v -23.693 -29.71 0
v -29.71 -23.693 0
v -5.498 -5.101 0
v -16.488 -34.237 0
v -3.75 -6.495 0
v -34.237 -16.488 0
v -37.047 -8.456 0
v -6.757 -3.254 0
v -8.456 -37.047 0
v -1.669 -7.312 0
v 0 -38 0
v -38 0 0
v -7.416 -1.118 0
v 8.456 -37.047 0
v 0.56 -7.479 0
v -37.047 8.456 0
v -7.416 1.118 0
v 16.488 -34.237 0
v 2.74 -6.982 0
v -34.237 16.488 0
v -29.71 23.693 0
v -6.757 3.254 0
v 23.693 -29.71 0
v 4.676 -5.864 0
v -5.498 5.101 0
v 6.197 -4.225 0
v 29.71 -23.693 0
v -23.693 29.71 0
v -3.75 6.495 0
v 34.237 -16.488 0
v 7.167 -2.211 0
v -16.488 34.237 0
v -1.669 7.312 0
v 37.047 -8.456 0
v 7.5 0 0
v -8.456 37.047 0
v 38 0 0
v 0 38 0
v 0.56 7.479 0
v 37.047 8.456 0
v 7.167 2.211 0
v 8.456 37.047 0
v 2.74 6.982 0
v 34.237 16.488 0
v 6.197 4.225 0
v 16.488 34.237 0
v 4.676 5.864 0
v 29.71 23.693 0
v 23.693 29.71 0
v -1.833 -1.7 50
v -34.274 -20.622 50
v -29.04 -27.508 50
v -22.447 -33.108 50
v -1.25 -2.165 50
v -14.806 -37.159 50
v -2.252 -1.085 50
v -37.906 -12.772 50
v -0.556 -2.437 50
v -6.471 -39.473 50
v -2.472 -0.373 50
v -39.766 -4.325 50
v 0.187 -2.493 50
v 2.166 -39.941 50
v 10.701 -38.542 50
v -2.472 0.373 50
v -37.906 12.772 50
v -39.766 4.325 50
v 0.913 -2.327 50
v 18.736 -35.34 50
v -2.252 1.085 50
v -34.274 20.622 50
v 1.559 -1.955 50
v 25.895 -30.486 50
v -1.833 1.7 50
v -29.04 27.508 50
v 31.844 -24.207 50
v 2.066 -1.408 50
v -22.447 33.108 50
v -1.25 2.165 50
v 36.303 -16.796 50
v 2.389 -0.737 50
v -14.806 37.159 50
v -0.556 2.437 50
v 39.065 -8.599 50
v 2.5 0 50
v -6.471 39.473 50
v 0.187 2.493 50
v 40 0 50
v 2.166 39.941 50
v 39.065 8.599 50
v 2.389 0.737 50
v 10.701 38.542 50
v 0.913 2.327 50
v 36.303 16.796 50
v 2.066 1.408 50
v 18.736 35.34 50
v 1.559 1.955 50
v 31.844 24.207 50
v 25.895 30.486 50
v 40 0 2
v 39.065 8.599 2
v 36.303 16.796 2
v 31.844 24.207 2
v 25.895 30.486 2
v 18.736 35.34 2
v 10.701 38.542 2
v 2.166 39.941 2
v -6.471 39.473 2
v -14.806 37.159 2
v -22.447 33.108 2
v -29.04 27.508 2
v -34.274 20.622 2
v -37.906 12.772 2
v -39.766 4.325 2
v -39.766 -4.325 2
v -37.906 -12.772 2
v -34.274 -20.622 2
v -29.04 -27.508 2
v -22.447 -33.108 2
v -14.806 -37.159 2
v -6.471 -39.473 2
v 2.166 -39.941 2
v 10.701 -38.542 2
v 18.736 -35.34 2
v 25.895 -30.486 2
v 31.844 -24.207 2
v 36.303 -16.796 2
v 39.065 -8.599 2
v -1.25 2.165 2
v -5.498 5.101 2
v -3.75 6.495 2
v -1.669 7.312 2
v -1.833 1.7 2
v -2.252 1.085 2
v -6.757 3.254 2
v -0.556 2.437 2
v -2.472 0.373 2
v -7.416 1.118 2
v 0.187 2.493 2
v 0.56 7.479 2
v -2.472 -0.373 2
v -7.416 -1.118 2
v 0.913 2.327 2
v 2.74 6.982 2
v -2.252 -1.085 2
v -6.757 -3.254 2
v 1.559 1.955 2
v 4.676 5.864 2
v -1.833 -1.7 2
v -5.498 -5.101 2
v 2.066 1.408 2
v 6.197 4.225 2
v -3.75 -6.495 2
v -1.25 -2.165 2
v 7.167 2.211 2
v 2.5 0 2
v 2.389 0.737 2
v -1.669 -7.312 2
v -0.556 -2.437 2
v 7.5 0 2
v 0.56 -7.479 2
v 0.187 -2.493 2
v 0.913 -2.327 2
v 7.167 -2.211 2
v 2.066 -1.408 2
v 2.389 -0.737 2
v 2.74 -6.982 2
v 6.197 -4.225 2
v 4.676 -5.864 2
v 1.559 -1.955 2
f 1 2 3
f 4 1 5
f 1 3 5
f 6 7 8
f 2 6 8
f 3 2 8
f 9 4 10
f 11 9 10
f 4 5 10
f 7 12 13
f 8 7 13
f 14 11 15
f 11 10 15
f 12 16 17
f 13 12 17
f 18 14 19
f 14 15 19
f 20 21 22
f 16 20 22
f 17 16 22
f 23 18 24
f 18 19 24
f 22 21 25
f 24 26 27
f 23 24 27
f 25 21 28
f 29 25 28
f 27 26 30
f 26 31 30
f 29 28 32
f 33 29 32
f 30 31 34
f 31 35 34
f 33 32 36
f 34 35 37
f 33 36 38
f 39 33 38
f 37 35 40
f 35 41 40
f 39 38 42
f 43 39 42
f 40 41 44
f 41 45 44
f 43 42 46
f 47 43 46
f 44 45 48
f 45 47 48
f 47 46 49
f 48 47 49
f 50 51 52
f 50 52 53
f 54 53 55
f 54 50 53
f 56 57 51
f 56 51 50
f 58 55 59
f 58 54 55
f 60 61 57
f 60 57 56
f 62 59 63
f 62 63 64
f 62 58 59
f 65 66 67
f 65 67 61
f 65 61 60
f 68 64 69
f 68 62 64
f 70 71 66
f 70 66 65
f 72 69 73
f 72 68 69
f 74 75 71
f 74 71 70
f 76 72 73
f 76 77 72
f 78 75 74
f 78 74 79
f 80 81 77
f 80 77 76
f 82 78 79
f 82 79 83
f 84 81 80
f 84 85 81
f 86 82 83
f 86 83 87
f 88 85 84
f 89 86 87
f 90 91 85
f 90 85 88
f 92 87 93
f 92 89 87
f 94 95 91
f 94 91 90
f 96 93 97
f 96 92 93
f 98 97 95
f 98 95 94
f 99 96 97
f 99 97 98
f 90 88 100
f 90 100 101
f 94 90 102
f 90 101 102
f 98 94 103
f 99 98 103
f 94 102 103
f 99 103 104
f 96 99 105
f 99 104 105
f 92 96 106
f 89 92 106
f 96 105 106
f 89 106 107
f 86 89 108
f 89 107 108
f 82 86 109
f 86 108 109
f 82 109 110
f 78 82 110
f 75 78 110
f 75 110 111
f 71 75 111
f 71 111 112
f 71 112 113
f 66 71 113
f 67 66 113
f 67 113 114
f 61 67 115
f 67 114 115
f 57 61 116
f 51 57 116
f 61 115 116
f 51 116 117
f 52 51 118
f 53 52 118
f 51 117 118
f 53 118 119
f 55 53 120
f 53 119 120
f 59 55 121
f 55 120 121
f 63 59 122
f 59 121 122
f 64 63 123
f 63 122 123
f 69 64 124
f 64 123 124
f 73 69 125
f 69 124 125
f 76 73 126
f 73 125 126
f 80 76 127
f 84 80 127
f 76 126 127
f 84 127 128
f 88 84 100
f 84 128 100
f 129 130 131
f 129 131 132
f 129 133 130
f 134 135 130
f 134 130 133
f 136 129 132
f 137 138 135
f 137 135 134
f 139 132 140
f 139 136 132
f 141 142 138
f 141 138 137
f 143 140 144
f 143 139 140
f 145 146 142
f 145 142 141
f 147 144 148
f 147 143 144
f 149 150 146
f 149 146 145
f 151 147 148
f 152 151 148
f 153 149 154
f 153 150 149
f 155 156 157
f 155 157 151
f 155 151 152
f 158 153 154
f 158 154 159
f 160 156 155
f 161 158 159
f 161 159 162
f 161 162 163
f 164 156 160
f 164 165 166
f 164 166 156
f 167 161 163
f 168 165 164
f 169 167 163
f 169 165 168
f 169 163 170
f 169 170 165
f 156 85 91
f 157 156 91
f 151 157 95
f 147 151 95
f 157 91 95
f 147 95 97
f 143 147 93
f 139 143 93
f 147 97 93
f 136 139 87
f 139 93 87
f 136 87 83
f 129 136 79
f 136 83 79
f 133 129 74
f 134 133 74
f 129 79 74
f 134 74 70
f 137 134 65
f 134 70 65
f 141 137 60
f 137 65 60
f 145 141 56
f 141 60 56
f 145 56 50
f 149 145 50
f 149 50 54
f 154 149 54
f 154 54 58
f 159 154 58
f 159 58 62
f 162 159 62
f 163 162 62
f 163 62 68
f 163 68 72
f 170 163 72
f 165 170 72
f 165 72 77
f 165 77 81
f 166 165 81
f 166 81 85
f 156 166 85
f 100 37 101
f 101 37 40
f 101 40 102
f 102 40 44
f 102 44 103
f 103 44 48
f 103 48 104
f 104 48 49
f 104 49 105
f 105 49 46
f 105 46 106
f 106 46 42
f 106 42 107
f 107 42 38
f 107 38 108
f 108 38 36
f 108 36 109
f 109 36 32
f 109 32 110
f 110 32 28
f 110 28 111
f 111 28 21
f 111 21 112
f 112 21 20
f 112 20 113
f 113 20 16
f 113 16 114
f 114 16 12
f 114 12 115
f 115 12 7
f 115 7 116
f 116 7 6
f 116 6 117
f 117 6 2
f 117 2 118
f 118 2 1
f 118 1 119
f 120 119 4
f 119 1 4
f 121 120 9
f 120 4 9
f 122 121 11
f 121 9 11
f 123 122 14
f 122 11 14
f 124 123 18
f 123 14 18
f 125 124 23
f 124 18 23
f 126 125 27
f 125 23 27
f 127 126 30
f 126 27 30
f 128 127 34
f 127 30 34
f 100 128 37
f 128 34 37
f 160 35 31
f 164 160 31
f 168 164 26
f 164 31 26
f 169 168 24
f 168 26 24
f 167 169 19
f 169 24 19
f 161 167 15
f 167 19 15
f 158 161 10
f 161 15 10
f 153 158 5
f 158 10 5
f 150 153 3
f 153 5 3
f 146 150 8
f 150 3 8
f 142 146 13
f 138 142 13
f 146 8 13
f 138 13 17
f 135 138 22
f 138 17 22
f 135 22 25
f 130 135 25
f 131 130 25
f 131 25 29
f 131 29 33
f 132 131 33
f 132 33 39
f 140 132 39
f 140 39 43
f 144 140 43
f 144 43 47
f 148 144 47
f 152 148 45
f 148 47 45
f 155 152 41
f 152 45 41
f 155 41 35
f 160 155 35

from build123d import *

# Parameters (mm, degrees)
F0_R     = 40
F1_DEPTH = 50
F2_R     = 2.5
F3_DEPTH = 50
F4_R     = 7.5
F5_DEPTH = 2
F6_SIZE  = 2


with BuildPart() as f1:
    # F0 (on Top) → F1 (new body)
    with BuildSketch(Plane.XY):
        Circle(F0_R)
    extrude(amount=F1_DEPTH)

    # F2 (on face) → F3 (cut)
    with BuildSketch(Plane.XY.offset(50)):
        Circle(F2_R)
    extrude(amount=-F3_DEPTH, mode=Mode.SUBTRACT)

    # F4 (on face) → F5 (cut)
    with BuildSketch(Plane(origin=(0, 0, 0), x_dir=(1, 0, 0), z_dir=(0, 0, -1))):
        Circle(F4_R)
    extrude(amount=-F5_DEPTH, mode=Mode.SUBTRACT)

    # F6
    f6_edges = [f1.edges().sort_by_distance(p)[0] for p in [
        (-40, 0, 0),
    ]]
    chamfer(f6_edges, length=F6_SIZE)


solid = f1.part
